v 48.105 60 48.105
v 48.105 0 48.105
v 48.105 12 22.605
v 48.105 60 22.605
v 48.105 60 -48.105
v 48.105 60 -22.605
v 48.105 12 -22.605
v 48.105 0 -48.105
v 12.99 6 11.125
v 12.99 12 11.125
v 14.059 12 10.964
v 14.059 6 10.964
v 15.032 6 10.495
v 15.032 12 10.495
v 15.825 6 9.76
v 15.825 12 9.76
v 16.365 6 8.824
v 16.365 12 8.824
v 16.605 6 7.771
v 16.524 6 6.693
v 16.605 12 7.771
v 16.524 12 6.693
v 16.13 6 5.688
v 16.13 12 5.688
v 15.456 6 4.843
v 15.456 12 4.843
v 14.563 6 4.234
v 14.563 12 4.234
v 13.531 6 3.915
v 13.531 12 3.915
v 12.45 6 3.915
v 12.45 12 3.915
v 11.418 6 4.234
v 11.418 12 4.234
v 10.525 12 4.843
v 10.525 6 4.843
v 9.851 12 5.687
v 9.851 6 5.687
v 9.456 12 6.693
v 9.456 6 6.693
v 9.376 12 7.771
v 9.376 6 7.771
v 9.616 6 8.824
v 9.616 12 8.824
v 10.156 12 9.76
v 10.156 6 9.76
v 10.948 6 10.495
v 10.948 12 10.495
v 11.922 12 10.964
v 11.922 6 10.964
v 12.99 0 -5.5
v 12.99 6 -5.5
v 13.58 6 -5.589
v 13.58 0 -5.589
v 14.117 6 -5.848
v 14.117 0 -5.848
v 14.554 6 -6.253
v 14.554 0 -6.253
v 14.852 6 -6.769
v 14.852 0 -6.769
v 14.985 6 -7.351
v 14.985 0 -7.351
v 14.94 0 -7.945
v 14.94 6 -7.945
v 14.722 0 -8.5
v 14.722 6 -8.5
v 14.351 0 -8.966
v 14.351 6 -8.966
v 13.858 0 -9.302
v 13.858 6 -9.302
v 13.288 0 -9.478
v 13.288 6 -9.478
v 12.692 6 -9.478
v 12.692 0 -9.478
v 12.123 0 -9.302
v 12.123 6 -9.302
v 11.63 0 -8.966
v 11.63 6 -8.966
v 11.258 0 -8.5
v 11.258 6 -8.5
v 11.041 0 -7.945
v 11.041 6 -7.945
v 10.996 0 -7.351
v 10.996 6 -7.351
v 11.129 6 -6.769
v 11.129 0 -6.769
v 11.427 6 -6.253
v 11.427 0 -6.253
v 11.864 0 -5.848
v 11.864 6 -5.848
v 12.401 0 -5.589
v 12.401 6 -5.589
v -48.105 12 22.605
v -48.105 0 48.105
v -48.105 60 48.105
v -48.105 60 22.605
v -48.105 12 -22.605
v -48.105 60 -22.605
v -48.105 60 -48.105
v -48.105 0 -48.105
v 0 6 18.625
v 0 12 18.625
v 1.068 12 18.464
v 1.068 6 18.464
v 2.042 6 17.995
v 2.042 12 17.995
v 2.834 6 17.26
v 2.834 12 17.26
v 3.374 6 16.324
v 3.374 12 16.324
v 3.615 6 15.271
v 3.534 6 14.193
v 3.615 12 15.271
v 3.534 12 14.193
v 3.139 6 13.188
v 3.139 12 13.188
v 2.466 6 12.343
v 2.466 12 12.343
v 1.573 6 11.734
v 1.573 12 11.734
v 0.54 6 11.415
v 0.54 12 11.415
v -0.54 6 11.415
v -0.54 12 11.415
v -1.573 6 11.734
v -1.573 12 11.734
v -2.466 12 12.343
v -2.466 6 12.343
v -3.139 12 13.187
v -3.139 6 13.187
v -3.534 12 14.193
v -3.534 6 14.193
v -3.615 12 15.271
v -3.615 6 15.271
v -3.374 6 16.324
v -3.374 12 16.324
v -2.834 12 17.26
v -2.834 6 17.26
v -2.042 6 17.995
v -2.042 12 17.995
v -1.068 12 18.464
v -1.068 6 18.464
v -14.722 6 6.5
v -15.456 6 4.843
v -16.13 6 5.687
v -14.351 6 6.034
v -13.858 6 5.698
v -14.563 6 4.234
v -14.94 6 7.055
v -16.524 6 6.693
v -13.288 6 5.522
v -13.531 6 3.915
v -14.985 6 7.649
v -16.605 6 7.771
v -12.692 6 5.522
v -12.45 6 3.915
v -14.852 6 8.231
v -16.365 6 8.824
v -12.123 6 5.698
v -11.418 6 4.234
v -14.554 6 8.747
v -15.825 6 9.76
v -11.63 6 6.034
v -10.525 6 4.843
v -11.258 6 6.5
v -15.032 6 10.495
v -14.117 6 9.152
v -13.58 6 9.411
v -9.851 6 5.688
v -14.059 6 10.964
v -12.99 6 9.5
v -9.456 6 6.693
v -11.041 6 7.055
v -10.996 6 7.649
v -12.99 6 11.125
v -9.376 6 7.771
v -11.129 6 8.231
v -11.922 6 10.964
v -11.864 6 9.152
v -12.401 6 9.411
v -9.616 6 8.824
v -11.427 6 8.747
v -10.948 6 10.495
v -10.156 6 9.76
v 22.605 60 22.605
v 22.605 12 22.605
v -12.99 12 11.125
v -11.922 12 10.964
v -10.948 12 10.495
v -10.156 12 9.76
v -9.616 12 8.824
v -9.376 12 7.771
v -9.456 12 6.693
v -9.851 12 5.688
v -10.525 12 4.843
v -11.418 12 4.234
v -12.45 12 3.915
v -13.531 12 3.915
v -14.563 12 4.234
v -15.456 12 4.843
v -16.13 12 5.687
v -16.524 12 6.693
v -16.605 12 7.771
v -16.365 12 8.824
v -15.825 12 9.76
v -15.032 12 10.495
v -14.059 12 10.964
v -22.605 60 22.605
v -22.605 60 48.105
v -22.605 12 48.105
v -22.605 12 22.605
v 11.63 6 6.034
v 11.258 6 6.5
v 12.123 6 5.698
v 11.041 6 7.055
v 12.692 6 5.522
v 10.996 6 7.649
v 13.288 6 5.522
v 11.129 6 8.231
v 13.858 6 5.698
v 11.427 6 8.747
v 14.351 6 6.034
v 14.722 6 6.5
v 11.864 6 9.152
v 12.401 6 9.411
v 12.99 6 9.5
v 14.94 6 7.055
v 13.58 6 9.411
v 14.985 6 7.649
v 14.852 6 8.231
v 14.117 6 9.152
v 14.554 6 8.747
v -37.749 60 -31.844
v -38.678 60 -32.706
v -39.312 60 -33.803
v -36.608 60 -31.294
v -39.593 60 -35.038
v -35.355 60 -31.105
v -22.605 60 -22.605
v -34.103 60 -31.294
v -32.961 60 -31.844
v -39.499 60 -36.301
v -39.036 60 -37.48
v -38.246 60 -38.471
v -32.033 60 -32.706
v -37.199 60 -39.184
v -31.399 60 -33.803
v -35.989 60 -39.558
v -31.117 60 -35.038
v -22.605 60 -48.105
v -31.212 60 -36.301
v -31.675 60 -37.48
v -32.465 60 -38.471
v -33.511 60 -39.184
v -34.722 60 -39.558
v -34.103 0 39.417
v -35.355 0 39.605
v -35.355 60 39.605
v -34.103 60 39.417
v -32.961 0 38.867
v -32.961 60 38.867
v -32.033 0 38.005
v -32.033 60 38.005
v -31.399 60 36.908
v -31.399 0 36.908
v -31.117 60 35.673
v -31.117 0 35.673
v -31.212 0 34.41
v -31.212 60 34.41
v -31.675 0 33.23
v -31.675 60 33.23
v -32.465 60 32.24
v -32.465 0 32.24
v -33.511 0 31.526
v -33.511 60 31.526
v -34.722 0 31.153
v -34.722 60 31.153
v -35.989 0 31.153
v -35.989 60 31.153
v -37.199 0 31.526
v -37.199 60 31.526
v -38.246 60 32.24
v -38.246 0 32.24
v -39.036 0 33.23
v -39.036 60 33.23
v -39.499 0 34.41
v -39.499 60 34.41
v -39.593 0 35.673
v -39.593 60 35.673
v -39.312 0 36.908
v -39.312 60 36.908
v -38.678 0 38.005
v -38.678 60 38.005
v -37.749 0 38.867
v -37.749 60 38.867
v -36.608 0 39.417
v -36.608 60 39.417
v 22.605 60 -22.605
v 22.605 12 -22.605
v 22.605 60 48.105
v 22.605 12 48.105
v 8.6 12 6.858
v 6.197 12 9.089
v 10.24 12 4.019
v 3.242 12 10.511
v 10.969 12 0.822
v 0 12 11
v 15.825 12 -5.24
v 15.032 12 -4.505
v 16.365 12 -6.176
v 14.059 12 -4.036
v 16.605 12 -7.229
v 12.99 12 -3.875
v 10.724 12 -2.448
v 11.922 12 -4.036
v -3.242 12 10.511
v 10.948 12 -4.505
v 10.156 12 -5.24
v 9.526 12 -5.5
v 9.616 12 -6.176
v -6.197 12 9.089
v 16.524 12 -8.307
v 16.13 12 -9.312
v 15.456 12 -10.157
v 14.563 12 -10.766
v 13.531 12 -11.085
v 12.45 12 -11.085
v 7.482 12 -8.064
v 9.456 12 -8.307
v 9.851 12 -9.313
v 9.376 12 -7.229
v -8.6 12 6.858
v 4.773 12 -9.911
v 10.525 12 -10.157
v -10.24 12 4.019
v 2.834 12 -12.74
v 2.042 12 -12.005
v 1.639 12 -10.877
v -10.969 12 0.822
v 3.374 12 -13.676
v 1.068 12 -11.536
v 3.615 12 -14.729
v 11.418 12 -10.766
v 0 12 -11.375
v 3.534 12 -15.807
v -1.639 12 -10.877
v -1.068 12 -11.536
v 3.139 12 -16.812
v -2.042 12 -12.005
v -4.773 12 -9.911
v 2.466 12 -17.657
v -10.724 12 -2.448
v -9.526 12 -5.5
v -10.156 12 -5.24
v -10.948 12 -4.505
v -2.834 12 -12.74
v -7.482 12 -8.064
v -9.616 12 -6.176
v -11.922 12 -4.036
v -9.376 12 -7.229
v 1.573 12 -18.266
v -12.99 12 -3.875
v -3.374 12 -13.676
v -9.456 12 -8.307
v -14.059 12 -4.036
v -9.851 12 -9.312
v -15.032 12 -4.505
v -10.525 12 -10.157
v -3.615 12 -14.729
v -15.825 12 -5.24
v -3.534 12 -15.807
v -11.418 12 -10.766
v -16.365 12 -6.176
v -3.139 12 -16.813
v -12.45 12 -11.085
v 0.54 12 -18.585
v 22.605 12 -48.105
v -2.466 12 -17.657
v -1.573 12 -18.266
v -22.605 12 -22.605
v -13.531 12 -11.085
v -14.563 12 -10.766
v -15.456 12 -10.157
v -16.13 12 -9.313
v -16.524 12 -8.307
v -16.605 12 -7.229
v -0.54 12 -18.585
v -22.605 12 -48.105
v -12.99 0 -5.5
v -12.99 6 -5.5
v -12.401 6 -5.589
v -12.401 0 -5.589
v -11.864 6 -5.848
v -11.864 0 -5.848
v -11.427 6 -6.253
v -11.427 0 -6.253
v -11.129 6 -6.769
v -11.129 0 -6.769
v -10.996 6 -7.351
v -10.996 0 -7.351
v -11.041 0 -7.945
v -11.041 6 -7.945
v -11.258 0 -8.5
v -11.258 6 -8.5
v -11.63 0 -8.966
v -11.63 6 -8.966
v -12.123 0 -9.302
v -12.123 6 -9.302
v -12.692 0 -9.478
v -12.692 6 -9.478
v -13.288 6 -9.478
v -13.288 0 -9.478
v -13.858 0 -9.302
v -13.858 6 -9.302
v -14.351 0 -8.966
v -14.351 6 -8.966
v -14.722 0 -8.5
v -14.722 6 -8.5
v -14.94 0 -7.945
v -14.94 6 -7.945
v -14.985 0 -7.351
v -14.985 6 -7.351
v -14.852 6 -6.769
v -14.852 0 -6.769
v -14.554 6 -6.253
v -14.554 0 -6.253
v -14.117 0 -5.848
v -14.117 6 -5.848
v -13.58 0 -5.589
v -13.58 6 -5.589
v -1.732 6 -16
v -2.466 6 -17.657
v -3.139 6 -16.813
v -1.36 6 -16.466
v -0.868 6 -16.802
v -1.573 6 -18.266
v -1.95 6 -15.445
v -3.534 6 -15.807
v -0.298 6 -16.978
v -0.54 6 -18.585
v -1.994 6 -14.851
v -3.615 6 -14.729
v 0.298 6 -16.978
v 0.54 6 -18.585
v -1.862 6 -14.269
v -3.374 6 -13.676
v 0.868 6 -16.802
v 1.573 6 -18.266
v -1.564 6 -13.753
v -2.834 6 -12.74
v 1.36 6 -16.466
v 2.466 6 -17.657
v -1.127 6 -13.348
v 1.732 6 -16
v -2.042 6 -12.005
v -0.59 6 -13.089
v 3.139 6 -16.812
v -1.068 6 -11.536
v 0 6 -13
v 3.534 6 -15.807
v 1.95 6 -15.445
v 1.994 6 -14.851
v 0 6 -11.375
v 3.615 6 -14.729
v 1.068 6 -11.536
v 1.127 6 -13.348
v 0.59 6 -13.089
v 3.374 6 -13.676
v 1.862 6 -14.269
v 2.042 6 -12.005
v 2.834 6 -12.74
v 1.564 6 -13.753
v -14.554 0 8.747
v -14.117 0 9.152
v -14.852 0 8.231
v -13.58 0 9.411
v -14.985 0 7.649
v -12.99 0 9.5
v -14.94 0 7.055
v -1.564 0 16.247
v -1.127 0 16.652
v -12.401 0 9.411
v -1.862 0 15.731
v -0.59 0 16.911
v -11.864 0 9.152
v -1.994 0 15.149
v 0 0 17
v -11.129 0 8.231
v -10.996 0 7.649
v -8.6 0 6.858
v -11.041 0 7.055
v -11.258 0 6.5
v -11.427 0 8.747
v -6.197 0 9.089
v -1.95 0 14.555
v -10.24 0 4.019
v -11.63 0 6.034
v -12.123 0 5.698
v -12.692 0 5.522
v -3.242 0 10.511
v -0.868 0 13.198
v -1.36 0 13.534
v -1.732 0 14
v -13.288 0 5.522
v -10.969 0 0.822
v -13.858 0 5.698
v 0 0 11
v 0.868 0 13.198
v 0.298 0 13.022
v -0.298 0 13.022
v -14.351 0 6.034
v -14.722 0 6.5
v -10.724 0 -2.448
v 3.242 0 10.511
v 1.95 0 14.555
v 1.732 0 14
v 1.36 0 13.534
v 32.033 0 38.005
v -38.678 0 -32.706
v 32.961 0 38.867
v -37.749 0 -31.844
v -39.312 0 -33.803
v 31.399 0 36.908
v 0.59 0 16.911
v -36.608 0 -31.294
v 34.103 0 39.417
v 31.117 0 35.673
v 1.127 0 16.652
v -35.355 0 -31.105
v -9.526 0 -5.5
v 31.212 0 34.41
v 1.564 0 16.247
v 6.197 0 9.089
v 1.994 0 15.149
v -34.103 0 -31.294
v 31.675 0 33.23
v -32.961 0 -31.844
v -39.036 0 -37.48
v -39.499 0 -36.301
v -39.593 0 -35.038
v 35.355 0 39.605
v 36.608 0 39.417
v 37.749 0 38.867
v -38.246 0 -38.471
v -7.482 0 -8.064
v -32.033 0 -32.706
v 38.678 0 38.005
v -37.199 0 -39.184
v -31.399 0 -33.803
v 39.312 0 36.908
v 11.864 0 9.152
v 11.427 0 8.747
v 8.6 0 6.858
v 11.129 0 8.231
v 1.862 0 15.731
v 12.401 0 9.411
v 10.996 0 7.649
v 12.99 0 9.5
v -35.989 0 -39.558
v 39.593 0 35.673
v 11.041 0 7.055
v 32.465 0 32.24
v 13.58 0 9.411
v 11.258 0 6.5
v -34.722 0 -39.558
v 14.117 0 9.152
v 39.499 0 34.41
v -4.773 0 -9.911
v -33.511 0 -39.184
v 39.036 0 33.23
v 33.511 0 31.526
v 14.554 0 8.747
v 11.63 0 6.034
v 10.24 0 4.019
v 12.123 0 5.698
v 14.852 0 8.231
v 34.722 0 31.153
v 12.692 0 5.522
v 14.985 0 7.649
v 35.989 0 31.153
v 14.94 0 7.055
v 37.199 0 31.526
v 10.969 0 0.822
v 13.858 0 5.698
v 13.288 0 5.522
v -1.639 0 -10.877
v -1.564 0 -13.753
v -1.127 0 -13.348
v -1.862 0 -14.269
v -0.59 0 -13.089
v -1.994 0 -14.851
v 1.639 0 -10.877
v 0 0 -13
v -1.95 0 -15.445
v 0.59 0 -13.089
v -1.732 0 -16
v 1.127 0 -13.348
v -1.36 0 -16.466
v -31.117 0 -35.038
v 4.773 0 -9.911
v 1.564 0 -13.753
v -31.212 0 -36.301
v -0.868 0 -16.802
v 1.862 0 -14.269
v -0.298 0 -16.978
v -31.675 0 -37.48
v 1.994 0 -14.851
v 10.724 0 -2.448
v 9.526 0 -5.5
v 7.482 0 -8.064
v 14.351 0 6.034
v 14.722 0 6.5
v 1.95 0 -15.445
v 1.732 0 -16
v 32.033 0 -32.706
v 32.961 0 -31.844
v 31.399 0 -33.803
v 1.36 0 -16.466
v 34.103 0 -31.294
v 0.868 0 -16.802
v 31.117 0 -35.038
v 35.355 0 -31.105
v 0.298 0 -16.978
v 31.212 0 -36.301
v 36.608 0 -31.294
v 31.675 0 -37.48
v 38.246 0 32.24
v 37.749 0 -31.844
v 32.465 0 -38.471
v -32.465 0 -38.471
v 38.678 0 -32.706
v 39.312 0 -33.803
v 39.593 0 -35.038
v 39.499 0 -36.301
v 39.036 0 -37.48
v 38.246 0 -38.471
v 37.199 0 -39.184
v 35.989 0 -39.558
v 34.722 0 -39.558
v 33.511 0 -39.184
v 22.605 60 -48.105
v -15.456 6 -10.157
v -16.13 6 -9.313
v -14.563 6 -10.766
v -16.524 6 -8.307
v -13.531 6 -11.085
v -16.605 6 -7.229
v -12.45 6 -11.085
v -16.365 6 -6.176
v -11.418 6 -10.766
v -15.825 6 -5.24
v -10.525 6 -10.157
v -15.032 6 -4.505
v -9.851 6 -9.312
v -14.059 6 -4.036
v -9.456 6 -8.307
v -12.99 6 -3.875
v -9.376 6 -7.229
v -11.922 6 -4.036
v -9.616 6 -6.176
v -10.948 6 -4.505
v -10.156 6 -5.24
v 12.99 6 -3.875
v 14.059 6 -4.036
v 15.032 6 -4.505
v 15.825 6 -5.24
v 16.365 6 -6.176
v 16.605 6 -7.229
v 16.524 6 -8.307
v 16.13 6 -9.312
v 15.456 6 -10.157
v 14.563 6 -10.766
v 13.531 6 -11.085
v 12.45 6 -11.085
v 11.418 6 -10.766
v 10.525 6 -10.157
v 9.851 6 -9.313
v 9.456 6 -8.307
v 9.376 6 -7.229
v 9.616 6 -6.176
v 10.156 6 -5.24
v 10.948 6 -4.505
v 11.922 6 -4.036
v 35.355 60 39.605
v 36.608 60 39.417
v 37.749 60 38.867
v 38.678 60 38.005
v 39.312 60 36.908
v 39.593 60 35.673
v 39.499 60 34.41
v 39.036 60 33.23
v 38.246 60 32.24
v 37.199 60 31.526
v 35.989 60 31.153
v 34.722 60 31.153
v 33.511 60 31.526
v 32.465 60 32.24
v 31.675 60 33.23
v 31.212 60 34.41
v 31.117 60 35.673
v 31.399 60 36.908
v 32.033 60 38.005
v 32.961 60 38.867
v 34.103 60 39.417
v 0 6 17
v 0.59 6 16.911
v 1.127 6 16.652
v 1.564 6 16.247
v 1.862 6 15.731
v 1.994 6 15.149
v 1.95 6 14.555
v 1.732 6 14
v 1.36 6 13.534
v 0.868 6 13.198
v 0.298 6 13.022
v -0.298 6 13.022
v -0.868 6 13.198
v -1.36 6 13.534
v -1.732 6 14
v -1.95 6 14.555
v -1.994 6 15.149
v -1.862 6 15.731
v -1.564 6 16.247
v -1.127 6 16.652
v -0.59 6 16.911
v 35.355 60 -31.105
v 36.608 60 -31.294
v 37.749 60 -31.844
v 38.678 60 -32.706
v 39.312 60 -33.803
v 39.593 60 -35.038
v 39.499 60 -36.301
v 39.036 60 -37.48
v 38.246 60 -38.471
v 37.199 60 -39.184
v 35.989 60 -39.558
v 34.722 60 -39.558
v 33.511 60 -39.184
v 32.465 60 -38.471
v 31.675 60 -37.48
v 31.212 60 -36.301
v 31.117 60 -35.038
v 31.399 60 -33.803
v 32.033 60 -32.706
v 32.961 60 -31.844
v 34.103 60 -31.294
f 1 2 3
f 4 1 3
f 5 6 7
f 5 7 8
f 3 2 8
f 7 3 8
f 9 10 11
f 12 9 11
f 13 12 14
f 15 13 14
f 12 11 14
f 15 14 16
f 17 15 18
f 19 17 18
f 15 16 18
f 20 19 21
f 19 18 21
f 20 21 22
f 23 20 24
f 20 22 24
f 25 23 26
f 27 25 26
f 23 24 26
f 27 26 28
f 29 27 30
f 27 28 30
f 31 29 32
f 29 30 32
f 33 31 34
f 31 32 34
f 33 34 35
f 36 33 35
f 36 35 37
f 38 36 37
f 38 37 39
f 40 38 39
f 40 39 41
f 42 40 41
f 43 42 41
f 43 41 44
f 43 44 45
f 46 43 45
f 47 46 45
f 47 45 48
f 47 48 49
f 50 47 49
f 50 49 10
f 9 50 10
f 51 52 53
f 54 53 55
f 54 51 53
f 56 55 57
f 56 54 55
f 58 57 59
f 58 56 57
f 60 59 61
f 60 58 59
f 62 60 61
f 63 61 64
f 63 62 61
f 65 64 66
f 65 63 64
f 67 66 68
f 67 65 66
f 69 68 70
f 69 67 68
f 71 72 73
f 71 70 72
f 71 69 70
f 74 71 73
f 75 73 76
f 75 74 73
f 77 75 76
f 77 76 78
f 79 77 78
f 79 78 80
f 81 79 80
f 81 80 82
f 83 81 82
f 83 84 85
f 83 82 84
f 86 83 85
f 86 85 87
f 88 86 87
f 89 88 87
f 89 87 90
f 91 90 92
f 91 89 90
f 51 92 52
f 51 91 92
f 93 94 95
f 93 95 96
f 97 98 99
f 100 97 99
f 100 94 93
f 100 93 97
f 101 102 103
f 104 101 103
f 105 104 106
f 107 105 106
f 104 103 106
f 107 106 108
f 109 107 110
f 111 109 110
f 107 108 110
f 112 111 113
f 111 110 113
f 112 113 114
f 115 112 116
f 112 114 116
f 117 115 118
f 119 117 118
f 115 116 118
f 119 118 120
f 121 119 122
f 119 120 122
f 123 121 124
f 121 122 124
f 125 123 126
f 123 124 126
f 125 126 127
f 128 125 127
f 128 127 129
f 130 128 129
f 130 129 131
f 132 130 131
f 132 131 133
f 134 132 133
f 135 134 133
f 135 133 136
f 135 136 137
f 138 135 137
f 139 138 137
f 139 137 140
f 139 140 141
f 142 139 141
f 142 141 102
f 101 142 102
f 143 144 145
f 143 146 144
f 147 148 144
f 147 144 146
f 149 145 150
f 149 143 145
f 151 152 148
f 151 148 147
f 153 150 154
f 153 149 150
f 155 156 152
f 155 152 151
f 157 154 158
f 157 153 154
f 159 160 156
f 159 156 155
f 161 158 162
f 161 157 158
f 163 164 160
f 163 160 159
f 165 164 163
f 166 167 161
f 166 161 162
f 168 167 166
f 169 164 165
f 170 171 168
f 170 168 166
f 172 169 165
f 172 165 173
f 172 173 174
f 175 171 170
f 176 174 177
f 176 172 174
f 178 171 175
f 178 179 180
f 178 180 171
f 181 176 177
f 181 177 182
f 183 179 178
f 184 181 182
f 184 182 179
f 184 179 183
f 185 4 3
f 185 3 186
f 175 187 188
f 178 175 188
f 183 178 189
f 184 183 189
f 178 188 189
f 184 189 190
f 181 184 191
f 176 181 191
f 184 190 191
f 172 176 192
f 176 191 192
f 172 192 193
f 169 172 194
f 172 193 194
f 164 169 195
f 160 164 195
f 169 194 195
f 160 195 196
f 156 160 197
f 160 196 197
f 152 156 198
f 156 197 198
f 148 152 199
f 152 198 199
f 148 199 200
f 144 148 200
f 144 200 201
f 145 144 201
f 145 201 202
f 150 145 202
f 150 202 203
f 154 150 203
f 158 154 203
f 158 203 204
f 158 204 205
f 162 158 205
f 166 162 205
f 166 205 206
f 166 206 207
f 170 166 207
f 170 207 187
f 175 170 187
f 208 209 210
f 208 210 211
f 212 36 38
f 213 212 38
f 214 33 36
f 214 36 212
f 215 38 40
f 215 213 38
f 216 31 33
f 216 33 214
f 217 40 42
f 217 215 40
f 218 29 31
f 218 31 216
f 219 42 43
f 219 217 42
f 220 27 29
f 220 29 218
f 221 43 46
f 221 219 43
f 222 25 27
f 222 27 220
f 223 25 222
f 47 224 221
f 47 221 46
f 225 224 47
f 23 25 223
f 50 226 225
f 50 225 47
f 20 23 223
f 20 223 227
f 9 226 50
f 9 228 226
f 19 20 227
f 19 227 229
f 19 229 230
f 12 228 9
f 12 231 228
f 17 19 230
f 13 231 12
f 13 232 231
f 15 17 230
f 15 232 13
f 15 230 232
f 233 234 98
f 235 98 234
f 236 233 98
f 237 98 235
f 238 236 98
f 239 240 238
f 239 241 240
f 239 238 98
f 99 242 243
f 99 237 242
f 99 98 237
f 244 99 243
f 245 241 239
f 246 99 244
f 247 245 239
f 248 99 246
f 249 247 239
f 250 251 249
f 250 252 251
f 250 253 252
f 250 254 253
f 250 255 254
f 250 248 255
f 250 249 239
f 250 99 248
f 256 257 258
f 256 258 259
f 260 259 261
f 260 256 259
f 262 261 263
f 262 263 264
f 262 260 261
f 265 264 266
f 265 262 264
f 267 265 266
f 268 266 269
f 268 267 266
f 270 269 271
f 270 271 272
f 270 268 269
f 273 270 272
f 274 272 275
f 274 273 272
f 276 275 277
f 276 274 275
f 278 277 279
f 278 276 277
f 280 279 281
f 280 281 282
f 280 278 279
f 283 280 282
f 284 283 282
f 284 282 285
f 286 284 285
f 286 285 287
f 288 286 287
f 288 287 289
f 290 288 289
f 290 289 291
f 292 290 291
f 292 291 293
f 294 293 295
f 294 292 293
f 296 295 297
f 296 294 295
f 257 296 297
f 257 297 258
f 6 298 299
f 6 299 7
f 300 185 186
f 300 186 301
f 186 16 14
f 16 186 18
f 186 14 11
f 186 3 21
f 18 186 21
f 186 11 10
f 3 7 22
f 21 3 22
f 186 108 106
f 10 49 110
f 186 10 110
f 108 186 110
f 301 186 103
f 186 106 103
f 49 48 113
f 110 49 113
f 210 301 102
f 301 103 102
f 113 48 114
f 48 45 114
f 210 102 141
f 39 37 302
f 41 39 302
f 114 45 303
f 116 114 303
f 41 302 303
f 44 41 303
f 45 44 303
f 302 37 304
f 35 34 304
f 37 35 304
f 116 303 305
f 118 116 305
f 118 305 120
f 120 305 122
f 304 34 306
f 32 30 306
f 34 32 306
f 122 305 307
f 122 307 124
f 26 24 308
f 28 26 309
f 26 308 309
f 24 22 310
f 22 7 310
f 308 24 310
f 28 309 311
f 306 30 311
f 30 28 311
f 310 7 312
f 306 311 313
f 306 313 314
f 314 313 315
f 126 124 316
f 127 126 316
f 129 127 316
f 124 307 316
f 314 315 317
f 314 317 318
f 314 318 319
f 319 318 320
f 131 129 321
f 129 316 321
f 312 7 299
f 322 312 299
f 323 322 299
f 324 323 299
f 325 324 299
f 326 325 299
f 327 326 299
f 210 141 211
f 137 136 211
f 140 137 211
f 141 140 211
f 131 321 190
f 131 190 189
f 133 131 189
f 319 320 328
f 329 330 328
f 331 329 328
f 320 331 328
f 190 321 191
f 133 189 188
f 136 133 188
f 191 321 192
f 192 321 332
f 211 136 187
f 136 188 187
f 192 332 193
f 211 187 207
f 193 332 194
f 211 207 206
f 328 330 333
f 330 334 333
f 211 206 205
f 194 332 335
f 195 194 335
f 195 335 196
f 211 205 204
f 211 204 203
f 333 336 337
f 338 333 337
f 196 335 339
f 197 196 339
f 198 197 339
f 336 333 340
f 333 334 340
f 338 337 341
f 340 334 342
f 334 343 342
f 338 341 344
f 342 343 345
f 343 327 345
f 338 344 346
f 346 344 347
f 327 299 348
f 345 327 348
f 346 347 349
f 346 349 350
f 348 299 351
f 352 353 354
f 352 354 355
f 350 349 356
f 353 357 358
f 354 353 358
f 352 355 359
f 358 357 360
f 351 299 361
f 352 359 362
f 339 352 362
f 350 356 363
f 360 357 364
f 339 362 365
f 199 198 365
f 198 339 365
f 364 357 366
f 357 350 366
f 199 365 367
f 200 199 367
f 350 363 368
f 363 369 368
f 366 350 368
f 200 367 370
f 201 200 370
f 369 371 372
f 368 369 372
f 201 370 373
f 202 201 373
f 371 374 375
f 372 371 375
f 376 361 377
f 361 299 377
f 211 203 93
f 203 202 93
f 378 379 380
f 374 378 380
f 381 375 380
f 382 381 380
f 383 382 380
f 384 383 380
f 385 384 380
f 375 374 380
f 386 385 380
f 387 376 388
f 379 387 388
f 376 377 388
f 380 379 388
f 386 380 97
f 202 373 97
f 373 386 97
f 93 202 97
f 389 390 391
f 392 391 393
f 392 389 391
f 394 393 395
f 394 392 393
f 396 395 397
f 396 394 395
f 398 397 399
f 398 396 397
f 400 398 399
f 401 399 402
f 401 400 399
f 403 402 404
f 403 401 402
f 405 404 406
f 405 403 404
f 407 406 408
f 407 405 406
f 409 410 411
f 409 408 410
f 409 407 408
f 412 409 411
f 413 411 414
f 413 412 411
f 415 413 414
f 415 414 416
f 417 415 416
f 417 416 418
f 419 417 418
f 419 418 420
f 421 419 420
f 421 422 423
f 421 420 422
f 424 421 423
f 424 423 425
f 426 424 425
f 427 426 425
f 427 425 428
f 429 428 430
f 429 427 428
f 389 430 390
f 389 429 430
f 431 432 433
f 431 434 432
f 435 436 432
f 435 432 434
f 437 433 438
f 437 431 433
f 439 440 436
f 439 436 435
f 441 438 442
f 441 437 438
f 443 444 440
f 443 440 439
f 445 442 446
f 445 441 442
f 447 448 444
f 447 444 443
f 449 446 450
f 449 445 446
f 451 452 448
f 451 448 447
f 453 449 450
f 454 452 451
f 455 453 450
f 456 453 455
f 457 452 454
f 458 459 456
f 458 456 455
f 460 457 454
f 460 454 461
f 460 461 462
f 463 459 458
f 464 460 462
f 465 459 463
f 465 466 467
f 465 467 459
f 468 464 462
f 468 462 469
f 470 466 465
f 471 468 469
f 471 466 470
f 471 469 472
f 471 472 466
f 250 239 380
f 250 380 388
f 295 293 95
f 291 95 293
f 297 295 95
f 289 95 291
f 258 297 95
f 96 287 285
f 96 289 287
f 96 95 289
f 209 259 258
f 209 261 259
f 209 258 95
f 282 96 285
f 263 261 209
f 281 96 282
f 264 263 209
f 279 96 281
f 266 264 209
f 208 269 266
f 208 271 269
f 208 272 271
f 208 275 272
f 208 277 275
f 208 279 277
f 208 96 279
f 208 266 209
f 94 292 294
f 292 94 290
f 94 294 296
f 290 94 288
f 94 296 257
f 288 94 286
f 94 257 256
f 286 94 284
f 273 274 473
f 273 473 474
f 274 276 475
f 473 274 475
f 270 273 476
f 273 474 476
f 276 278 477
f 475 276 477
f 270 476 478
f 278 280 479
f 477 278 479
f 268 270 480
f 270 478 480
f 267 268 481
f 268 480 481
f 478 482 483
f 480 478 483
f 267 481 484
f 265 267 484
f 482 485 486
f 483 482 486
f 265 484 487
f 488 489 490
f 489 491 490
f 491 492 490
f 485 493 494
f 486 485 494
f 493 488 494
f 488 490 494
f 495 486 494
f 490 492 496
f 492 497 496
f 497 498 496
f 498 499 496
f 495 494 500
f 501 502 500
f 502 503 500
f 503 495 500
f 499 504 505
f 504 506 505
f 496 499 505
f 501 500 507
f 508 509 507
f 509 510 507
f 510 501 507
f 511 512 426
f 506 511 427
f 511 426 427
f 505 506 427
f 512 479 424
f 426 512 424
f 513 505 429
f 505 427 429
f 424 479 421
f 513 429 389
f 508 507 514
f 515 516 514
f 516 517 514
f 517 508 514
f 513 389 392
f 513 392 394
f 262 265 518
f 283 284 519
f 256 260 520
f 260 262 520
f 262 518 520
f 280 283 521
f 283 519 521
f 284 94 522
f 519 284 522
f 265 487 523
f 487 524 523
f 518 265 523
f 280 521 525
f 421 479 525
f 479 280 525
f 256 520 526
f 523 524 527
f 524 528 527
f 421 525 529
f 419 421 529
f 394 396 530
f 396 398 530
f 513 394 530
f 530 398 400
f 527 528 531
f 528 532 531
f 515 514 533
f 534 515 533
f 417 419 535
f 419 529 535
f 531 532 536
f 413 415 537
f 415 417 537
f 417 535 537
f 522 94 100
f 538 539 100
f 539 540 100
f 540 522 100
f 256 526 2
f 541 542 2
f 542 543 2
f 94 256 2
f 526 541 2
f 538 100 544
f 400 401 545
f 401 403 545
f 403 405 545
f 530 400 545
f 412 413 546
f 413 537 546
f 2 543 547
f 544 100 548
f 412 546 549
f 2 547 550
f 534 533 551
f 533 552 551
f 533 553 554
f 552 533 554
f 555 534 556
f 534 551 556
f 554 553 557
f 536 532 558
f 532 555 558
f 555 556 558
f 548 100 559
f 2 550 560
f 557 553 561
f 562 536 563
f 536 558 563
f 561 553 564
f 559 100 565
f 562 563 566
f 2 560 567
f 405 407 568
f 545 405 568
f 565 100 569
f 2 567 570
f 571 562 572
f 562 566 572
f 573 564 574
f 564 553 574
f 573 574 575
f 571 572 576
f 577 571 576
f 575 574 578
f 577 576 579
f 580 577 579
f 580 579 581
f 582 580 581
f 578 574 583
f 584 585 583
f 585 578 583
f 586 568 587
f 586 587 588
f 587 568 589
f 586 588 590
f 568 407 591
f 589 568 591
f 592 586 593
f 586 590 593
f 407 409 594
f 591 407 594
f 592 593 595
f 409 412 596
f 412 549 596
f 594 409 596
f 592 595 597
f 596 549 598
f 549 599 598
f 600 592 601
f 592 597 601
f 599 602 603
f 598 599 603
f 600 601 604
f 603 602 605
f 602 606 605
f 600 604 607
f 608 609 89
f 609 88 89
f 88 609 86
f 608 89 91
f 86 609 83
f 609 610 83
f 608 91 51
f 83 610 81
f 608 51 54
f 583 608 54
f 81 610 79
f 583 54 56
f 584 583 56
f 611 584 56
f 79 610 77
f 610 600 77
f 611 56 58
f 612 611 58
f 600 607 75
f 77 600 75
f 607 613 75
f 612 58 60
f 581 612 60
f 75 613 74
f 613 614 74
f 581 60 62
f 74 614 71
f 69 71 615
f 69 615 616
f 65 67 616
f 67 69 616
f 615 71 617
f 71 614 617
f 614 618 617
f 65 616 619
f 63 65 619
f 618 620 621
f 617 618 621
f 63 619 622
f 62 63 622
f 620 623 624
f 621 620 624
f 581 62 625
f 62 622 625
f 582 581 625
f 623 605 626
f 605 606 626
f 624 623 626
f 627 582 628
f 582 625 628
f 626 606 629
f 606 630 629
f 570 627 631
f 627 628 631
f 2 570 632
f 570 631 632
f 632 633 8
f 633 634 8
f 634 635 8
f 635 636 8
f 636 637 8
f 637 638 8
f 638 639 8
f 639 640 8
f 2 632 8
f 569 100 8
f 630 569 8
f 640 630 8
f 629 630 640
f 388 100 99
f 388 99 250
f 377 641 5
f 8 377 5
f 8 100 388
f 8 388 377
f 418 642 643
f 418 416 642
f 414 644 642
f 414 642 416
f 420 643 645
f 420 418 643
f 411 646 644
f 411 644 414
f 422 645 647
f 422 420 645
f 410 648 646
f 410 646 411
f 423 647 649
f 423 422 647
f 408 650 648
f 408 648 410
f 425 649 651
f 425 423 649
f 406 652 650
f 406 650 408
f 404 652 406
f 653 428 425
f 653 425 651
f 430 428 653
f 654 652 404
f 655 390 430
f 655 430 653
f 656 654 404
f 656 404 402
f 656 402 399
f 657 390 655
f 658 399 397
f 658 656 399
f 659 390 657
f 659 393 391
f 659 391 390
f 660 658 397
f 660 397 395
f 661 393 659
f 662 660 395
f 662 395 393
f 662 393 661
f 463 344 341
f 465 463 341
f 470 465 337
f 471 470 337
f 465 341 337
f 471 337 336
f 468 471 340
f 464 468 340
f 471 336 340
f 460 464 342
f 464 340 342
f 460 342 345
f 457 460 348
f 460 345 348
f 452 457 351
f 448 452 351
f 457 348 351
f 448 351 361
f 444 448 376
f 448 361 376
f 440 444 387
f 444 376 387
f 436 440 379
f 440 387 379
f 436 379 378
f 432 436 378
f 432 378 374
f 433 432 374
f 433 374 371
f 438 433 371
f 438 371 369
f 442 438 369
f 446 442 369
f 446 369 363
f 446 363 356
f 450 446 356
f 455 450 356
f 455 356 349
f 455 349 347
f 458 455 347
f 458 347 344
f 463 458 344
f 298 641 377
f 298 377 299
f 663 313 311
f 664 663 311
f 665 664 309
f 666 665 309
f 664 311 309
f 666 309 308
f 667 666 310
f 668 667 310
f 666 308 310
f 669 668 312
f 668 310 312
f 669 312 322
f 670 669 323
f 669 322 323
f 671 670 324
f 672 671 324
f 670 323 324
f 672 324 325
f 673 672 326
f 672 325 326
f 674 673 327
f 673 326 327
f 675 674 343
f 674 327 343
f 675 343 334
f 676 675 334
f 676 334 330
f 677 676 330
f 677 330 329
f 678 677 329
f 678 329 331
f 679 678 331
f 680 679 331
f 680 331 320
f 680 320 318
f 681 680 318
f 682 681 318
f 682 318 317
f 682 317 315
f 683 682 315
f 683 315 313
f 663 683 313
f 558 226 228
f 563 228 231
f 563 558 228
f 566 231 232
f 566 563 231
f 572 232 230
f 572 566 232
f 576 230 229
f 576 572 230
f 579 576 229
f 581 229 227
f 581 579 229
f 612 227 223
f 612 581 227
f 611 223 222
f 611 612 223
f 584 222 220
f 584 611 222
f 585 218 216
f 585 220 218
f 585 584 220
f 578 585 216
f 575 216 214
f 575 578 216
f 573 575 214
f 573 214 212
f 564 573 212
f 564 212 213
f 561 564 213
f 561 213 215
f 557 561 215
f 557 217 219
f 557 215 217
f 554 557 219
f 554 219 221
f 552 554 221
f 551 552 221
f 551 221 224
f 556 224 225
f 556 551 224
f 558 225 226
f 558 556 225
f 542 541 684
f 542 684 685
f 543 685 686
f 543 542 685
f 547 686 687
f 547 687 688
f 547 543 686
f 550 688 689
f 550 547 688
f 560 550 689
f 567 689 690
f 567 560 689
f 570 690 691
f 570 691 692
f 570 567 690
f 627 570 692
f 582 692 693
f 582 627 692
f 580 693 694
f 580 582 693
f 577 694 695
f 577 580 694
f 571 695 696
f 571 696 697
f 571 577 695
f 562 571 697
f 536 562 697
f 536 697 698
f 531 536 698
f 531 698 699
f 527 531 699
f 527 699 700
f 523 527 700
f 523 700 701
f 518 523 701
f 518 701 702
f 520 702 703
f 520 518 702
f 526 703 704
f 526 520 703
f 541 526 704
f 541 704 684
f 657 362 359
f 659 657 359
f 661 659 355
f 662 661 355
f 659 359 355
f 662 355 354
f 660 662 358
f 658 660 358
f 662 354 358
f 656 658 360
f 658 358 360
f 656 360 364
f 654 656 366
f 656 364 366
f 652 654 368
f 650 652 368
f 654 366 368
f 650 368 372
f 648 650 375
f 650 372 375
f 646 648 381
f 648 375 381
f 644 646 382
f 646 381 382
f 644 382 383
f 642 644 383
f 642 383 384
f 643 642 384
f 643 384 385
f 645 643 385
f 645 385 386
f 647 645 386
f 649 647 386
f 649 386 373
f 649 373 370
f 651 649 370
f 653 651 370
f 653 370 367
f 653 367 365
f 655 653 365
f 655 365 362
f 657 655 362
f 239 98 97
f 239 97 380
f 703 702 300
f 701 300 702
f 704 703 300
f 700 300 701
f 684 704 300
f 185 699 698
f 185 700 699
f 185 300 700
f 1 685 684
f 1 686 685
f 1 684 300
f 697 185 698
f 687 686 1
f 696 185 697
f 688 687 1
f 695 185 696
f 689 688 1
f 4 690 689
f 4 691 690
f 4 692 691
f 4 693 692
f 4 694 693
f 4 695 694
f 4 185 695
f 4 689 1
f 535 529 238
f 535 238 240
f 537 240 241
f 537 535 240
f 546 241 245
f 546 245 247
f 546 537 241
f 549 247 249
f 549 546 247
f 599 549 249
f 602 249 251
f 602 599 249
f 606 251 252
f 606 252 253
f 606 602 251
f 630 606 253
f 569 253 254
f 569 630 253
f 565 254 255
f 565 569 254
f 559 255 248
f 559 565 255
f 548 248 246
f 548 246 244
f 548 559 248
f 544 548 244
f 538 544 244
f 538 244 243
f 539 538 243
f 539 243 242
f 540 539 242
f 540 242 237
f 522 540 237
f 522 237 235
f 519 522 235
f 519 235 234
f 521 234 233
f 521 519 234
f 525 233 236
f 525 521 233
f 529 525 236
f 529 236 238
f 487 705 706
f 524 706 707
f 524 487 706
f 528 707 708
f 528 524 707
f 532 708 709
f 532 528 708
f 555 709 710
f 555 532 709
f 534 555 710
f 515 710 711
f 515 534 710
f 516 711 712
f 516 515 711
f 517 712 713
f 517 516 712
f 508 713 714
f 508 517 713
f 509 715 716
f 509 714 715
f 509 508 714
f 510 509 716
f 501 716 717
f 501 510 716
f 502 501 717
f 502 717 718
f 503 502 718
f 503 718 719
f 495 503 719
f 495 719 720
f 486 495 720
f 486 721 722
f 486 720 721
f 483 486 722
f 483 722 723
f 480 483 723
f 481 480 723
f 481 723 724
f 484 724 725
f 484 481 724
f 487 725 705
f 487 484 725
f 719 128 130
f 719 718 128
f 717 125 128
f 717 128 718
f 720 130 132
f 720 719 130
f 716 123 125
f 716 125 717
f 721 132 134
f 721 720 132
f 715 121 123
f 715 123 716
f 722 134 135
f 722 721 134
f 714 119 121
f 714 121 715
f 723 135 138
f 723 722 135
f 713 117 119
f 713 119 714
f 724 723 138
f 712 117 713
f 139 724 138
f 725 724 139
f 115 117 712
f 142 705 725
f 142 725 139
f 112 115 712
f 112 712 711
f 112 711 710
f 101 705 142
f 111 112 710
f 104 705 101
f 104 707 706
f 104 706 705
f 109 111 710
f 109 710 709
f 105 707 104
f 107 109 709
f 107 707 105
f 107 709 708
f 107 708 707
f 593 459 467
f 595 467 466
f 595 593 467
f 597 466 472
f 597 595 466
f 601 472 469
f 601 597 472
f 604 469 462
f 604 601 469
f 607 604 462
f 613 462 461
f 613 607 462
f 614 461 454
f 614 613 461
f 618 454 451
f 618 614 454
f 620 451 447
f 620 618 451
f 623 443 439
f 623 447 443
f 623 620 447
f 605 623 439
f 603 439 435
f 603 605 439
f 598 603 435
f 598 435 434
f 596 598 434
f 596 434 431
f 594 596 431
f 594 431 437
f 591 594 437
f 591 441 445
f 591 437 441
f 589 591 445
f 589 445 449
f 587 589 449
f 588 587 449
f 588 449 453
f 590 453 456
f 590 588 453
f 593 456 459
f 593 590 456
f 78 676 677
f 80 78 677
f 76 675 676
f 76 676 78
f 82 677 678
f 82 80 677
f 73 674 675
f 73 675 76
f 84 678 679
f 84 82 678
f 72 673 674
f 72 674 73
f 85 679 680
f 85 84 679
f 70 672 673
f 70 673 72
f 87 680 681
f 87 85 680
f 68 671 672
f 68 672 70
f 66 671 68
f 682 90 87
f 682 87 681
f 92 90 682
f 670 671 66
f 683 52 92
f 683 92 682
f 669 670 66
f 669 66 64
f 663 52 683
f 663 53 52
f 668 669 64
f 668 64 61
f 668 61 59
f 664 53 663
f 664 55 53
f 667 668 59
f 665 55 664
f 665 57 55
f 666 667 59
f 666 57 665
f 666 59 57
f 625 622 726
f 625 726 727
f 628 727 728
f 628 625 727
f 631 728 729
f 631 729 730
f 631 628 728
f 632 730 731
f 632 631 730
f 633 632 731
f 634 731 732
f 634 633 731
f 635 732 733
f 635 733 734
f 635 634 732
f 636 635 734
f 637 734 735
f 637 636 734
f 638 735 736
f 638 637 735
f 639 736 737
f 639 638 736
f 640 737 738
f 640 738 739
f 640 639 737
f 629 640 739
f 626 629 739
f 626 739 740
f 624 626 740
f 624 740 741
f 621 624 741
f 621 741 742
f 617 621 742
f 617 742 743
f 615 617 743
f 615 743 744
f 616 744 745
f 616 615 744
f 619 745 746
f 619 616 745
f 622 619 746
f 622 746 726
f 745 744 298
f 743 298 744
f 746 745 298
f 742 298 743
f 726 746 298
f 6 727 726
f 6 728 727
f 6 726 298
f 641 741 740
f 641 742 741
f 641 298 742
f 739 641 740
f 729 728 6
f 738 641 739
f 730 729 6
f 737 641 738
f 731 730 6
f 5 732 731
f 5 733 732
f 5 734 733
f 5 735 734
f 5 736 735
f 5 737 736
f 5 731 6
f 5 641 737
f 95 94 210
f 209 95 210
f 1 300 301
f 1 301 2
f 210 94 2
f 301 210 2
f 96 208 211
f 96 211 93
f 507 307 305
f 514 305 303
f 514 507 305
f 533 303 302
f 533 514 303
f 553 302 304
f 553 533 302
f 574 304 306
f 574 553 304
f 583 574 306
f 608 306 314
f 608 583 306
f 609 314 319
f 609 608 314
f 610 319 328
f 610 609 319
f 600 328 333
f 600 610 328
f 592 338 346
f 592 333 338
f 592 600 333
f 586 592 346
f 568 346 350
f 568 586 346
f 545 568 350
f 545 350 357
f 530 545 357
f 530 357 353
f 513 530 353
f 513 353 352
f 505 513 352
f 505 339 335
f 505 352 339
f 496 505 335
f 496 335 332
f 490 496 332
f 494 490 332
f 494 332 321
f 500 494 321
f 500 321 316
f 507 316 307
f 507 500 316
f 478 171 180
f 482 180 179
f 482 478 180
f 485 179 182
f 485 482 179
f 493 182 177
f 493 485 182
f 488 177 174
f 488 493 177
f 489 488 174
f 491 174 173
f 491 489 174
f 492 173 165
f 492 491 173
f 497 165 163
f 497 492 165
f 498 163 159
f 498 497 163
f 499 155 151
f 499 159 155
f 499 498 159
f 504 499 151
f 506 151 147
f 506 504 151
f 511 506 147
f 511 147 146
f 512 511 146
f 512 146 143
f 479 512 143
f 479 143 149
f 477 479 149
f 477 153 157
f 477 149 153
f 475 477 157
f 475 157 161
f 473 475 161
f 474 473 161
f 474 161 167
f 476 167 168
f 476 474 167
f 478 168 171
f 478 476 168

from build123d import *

# Parameters (mm, degrees)
SKETCH1_W                               = 96.210678118
SKETCH1_H                               = 96.210678118
SKETCH1_R                               = 11
SKETCH1_R_2                             = 2
SKETCH1_R_3                             = 4.25
MAIN_BODY_DEPTH                         = 60
MAIN_MILL_CUT_DEPTH                     = 48
SKETCH2_R                               = 3.625
MOTOR_MOUNT_BOLT_HEAD_COUNTERSINK_DEPTH = 54


with BuildPart() as part:
    # Sketch1 → main body (new body)
    with BuildSketch(Plane(origin=(0, 0, 0), x_dir=(1, 0, 0), z_dir=(0, 1, 0))):
        Rectangle(SKETCH1_W, SKETCH1_H)
        with Locations(Location((0, 0, 0), (0, 0, 270))):
            Circle(SKETCH1_R, mode=Mode.SUBTRACT)
        with Locations(Location((0, 15, 0), (0, 0, 270))):
            Circle(SKETCH1_R_2, mode=Mode.SUBTRACT)
        with Locations(Location((35.355339059, 35.355339059, 0), (0, 0, 270))):
            Circle(SKETCH1_R_3, mode=Mode.SUBTRACT)
        with Locations(Location((12.990381057, 7.5, 0), (0, 0, 270))):
            Circle(SKETCH1_R_2, mode=Mode.SUBTRACT)
        with Locations(Location((12.990381057, -7.5, 0), (0, 0, 270))):
            Circle(SKETCH1_R_2, mode=Mode.SUBTRACT)
        with Locations(Location((0, -15, 0), (0, 0, 270))):
            Circle(SKETCH1_R_2, mode=Mode.SUBTRACT)
        with Locations(Location((-12.990381057, -7.5, 0), (0, 0, 270))):
            Circle(SKETCH1_R_2, mode=Mode.SUBTRACT)
        with Locations(Location((-12.990381057, 7.5, 0), (0, 0, 270))):
            Circle(SKETCH1_R_2, mode=Mode.SUBTRACT)
        with Locations(Location((35.355339059, -35.355339059, 0), (0, 0, 270))):
            Circle(SKETCH1_R_3, mode=Mode.SUBTRACT)
        with Locations(Location((-35.355339059, -35.355339059, 0), (0, 0, 270))):
            Circle(SKETCH1_R_3, mode=Mode.SUBTRACT)
        with Locations(Location((-35.355339059, 35.355339059, 0), (0, 0, 270))):
            Circle(SKETCH1_R_3, mode=Mode.SUBTRACT)
    extrude(amount=MAIN_BODY_DEPTH)

    # Sketch4 → main mill cut (cut)
    with BuildSketch(Plane(origin=(0, 60, 0), x_dir=(1, 0, 0), z_dir=(0, 1, 0))):
        Polygon((-22.605339059, 48.105339059), (22.605339059, 48.105339059), (22.605339059, 22.605339059), (48.105339059, 22.605339059), (48.105339059, -22.605339059), (22.605339059, -22.605339059), (22.605339059, -48.105339059), (-22.605339059, -48.105339059), (-22.605339059, -22.605339059), (-48.105339059, -22.605339059), (-48.105339059, 22.605339059), (-22.605339059, 22.605339059), align=None)
    extrude(amount=-MAIN_MILL_CUT_DEPTH, mode=Mode.SUBTRACT)

    # Sketch2 → motor mount bolt head countersink (cut)
    with BuildSketch(Plane(origin=(0, 60, 0), x_dir=(1, 0, 0), z_dir=(0, 1, 0))):
        with Locations(Location((12.990381057, 7.5, 0), (0, 0, 270))):
            Circle(SKETCH2_R)
        with Locations(Location((0, 15, 0), (0, 0, 270))):
            Circle(SKETCH2_R)
        with Locations(Location((12.990381057, -7.5, 0), (0, 0, 270))):
            Circle(SKETCH2_R)
        with Locations(Location((0, -15, 0), (0, 0, 270))):
            Circle(SKETCH2_R)
        with Locations(Location((-12.990381057, -7.5, 0), (0, 0, 270))):
            Circle(SKETCH2_R)
        with Locations(Location((-12.990381057, 7.5, 0), (0, 0, 270))):
            Circle(SKETCH2_R)
    extrude(amount=-MOTOR_MOUNT_BOLT_HEAD_COUNTERSINK_DEPTH, mode=Mode.SUBTRACT)


solid = part.part
